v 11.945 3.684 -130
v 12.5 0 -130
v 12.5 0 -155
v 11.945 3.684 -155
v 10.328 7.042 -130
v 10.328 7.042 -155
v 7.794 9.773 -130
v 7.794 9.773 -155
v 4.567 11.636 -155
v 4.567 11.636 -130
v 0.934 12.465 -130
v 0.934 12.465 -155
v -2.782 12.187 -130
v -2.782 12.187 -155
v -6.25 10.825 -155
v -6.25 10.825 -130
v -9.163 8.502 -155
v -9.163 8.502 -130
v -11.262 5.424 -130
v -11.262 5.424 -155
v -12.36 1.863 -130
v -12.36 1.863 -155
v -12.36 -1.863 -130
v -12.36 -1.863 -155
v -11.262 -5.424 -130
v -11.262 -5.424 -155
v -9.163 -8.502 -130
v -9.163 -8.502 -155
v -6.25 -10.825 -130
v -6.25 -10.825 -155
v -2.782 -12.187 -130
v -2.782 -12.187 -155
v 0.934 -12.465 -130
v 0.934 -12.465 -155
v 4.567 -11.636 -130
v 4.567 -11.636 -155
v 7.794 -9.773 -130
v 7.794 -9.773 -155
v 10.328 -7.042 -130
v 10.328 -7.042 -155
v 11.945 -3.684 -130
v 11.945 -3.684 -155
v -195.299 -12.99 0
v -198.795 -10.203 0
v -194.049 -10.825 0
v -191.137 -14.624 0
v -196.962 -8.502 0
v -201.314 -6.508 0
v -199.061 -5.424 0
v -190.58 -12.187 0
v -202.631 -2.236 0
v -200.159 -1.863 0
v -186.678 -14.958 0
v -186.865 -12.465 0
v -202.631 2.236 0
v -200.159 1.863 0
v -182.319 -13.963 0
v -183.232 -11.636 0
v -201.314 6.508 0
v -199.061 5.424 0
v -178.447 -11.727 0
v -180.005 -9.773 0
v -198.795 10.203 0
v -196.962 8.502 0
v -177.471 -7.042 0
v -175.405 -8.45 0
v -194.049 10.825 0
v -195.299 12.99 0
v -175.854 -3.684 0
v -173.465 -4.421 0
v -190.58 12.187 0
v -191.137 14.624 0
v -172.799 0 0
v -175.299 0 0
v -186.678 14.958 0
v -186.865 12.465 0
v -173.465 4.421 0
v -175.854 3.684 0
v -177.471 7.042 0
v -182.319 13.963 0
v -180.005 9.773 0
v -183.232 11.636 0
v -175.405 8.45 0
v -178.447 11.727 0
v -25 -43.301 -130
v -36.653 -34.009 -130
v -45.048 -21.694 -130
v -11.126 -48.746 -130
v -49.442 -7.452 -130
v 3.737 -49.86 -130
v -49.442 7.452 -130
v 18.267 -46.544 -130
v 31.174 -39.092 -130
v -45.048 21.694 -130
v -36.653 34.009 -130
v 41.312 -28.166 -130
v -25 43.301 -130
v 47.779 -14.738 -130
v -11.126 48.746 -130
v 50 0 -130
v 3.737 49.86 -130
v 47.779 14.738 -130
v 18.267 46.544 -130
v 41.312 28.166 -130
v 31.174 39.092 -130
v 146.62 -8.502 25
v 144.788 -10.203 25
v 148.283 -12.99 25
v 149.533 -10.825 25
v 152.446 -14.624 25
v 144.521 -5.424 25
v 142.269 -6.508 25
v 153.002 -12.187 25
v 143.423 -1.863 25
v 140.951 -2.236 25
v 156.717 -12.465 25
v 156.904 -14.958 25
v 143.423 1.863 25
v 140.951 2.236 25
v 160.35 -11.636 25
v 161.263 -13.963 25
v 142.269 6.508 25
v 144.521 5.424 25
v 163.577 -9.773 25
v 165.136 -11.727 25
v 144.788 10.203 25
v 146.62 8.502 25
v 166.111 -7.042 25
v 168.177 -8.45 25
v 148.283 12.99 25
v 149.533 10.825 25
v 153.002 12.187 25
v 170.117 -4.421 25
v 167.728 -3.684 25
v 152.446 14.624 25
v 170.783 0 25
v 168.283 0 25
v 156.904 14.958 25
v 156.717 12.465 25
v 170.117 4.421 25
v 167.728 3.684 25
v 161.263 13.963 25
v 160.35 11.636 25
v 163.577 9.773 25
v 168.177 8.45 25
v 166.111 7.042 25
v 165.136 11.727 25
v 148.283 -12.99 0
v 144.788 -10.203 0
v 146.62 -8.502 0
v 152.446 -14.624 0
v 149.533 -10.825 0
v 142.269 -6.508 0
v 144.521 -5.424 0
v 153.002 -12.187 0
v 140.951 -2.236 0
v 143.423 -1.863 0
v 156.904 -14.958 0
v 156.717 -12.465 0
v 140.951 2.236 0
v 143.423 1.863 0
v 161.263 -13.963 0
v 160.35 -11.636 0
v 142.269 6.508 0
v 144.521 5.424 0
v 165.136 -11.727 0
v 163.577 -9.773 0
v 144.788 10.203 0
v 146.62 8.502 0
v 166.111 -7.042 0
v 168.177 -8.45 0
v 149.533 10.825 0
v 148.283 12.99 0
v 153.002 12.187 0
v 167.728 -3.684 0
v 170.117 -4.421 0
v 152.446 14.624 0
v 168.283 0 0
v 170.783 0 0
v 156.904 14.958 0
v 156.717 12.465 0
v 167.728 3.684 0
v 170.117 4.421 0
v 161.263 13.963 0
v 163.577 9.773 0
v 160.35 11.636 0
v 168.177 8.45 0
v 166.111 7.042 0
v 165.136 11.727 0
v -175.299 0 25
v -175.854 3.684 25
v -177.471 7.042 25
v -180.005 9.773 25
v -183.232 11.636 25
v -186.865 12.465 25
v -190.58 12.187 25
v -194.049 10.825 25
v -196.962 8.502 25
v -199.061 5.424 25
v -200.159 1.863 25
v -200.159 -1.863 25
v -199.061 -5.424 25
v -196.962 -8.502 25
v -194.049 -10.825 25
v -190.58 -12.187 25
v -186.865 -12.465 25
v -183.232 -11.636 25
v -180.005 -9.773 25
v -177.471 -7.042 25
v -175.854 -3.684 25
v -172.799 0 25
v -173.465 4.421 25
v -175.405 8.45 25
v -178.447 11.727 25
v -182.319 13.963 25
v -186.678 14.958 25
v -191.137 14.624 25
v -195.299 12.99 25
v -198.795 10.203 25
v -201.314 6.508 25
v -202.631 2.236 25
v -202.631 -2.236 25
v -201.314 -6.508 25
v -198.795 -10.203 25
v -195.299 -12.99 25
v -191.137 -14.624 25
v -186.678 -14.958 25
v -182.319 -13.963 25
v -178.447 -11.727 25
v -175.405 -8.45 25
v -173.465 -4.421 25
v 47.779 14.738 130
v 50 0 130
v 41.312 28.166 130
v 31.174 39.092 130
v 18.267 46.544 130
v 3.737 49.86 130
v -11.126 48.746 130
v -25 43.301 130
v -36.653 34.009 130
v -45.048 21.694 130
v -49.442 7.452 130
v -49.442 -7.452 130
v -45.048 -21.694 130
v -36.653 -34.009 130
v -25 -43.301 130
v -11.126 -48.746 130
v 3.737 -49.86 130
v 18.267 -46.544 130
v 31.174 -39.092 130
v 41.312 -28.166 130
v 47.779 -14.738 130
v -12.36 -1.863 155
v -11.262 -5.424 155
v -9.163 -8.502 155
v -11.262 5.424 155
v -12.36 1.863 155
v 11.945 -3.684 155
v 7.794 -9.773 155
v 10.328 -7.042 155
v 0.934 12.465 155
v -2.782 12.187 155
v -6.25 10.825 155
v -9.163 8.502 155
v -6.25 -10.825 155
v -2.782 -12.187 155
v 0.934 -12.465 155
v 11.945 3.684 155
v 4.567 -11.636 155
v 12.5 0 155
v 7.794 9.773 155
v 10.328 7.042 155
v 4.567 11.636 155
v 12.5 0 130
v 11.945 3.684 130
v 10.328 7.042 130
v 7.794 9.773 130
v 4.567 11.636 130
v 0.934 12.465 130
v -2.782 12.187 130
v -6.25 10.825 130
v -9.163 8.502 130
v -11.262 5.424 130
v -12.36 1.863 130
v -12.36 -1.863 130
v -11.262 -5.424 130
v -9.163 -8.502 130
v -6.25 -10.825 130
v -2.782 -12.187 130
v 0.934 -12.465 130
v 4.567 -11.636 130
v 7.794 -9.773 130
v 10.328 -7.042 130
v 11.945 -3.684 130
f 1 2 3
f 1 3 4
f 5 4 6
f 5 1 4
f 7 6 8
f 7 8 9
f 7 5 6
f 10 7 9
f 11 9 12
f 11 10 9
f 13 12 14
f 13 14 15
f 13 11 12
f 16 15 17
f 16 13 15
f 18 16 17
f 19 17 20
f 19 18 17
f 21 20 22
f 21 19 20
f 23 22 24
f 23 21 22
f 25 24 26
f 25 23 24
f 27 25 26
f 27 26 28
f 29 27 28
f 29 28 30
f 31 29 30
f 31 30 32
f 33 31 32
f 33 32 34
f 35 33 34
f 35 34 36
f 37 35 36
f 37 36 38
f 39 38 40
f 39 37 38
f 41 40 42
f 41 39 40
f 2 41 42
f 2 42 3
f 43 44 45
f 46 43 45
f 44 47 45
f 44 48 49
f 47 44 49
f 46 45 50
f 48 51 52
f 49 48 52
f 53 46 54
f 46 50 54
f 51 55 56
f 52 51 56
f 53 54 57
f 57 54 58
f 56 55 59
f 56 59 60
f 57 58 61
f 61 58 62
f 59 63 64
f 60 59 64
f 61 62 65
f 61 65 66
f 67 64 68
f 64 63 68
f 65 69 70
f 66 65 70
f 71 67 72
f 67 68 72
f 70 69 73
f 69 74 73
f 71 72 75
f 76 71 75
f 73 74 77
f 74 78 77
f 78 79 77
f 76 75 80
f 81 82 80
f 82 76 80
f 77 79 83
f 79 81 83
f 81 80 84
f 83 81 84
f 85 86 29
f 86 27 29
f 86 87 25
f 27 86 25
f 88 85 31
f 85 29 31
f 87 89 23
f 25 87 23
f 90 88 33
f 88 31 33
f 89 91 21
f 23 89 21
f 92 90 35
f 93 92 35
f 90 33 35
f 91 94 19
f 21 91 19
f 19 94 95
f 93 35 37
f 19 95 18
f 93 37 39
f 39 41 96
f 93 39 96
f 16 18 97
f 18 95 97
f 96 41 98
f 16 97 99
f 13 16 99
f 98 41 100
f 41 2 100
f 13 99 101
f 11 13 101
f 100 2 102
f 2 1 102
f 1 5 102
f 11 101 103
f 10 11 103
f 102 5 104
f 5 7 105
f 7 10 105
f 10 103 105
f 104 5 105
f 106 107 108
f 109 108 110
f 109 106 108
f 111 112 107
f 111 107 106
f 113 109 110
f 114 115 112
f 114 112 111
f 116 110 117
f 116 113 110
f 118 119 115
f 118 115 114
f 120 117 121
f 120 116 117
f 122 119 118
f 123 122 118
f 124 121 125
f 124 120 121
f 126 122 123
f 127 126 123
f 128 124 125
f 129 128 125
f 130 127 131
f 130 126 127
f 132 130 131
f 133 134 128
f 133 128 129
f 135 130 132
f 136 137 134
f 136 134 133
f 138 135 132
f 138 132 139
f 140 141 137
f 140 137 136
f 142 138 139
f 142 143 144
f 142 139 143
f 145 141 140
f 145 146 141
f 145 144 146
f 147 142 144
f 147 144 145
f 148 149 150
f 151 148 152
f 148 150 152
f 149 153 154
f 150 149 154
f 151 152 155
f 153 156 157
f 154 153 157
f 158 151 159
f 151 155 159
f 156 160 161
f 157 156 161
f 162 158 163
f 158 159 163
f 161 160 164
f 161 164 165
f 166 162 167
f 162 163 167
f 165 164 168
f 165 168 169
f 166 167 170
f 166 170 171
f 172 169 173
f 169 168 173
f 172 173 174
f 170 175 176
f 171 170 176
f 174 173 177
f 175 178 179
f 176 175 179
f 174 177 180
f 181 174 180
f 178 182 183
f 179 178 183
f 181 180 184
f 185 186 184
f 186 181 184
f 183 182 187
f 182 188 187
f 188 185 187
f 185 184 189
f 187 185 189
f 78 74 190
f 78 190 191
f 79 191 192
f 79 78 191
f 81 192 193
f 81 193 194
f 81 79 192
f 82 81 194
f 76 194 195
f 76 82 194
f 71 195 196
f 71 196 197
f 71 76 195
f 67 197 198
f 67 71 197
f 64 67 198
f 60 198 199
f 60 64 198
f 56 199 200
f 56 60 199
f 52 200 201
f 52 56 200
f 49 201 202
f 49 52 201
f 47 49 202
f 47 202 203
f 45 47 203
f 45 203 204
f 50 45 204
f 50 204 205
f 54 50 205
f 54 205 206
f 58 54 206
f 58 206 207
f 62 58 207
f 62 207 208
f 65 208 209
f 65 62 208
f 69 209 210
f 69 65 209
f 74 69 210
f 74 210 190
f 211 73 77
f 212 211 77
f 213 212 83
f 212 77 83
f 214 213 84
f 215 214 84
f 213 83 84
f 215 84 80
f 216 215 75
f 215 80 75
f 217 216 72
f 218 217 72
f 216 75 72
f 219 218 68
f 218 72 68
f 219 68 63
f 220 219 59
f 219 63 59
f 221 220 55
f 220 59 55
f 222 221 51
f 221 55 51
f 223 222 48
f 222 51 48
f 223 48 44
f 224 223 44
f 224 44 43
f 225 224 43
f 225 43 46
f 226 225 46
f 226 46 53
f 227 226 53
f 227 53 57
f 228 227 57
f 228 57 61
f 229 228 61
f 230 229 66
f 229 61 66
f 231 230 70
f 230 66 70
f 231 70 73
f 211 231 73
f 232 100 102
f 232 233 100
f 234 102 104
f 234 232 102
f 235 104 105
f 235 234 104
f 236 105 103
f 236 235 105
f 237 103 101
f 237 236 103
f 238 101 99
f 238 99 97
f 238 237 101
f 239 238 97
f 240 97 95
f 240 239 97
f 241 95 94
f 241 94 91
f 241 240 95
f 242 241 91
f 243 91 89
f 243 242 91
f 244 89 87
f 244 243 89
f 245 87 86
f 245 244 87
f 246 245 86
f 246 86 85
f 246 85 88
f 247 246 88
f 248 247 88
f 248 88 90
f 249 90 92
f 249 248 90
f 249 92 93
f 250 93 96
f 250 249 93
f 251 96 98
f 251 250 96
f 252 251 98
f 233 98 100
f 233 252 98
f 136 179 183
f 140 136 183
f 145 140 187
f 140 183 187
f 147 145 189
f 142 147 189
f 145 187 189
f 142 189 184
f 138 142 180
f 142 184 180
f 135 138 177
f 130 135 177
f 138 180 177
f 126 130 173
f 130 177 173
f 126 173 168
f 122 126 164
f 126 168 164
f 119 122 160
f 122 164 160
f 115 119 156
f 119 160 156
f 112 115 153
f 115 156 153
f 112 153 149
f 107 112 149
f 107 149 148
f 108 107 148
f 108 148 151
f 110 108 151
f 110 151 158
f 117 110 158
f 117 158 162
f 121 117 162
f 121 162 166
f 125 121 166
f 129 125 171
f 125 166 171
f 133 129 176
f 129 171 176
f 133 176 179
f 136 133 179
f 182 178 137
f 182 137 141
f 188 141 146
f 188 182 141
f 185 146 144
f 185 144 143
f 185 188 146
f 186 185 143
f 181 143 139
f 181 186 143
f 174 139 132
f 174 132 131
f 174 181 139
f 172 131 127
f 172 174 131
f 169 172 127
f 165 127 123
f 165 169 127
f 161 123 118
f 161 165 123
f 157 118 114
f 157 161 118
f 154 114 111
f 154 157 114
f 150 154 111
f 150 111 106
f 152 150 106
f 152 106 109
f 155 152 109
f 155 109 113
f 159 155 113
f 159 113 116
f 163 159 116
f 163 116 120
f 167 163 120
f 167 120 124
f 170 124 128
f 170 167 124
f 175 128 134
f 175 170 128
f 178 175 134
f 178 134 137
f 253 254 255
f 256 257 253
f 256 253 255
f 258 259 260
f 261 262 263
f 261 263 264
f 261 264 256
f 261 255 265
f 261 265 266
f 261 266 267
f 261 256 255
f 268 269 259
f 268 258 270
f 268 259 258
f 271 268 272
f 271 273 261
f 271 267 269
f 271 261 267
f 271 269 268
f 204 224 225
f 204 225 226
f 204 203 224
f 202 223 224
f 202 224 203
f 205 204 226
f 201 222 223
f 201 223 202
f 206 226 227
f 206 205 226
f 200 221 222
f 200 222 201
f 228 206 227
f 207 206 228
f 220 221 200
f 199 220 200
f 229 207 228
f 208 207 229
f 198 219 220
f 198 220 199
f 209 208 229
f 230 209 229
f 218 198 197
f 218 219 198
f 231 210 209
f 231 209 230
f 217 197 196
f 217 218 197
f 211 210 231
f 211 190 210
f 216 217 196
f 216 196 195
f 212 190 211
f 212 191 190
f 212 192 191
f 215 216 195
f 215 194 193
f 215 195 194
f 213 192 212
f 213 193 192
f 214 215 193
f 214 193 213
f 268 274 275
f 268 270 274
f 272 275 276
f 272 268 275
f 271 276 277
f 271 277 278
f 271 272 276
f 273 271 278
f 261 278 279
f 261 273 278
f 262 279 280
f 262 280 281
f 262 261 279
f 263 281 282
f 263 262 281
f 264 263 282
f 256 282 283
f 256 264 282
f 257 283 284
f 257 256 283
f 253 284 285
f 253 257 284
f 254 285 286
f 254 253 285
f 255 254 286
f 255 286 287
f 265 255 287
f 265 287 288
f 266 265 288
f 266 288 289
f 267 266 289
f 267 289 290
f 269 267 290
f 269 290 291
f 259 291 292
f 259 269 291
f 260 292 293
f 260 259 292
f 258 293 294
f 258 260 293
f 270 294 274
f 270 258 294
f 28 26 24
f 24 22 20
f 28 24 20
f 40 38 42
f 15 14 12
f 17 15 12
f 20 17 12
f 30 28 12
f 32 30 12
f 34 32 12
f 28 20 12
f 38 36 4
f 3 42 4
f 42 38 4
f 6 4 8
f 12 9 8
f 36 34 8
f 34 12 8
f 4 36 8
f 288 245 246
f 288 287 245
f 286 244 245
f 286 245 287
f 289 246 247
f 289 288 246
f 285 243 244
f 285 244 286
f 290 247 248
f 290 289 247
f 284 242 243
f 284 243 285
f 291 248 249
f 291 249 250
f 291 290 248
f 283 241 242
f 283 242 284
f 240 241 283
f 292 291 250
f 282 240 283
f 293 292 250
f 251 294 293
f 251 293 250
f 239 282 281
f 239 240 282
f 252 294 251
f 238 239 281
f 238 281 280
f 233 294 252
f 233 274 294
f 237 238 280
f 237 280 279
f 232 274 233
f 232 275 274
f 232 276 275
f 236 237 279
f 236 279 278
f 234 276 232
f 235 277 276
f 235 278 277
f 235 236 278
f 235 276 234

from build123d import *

# Parameters (mm, degrees)
F0_R     = 12.5
F1_DEPTH = 155
F0_R_2   = 50
F2_DEPTH = 130
F3_R     = 15
F3_R_2   = 12.5
F4_DEPTH = 25


with BuildPart() as f1:
    # F0 (on Top) → F1 (new body, symmetric)
    with BuildSketch(Plane.XY):
        Circle(F0_R)
    extrude(amount=F1_DEPTH, both=True)

    # F0 (on Top) → F2 (join, symmetric)
    with BuildSketch(Plane.XY):
        Circle(F0_R_2)
        Circle(F0_R, mode=Mode.SUBTRACT)
    extrude(amount=F2_DEPTH, both=True)


with BuildPart() as f4:
    # F3 (on Top) → F4 (new body)
    with BuildSketch(Plane.XY):
        with Locations((-187.79898, 0)):
            Circle(F3_R)
        with Locations((-187.79898, 0)):
            Circle(F3_R_2, mode=Mode.SUBTRACT)
        with Locations((155.783349, 0)):
            Circle(F3_R)
        with Locations((155.783349, 0)):
            Circle(F3_R_2, mode=Mode.SUBTRACT)
    extrude(amount=F4_DEPTH)


solid = Compound([f1.part, f4.part])
